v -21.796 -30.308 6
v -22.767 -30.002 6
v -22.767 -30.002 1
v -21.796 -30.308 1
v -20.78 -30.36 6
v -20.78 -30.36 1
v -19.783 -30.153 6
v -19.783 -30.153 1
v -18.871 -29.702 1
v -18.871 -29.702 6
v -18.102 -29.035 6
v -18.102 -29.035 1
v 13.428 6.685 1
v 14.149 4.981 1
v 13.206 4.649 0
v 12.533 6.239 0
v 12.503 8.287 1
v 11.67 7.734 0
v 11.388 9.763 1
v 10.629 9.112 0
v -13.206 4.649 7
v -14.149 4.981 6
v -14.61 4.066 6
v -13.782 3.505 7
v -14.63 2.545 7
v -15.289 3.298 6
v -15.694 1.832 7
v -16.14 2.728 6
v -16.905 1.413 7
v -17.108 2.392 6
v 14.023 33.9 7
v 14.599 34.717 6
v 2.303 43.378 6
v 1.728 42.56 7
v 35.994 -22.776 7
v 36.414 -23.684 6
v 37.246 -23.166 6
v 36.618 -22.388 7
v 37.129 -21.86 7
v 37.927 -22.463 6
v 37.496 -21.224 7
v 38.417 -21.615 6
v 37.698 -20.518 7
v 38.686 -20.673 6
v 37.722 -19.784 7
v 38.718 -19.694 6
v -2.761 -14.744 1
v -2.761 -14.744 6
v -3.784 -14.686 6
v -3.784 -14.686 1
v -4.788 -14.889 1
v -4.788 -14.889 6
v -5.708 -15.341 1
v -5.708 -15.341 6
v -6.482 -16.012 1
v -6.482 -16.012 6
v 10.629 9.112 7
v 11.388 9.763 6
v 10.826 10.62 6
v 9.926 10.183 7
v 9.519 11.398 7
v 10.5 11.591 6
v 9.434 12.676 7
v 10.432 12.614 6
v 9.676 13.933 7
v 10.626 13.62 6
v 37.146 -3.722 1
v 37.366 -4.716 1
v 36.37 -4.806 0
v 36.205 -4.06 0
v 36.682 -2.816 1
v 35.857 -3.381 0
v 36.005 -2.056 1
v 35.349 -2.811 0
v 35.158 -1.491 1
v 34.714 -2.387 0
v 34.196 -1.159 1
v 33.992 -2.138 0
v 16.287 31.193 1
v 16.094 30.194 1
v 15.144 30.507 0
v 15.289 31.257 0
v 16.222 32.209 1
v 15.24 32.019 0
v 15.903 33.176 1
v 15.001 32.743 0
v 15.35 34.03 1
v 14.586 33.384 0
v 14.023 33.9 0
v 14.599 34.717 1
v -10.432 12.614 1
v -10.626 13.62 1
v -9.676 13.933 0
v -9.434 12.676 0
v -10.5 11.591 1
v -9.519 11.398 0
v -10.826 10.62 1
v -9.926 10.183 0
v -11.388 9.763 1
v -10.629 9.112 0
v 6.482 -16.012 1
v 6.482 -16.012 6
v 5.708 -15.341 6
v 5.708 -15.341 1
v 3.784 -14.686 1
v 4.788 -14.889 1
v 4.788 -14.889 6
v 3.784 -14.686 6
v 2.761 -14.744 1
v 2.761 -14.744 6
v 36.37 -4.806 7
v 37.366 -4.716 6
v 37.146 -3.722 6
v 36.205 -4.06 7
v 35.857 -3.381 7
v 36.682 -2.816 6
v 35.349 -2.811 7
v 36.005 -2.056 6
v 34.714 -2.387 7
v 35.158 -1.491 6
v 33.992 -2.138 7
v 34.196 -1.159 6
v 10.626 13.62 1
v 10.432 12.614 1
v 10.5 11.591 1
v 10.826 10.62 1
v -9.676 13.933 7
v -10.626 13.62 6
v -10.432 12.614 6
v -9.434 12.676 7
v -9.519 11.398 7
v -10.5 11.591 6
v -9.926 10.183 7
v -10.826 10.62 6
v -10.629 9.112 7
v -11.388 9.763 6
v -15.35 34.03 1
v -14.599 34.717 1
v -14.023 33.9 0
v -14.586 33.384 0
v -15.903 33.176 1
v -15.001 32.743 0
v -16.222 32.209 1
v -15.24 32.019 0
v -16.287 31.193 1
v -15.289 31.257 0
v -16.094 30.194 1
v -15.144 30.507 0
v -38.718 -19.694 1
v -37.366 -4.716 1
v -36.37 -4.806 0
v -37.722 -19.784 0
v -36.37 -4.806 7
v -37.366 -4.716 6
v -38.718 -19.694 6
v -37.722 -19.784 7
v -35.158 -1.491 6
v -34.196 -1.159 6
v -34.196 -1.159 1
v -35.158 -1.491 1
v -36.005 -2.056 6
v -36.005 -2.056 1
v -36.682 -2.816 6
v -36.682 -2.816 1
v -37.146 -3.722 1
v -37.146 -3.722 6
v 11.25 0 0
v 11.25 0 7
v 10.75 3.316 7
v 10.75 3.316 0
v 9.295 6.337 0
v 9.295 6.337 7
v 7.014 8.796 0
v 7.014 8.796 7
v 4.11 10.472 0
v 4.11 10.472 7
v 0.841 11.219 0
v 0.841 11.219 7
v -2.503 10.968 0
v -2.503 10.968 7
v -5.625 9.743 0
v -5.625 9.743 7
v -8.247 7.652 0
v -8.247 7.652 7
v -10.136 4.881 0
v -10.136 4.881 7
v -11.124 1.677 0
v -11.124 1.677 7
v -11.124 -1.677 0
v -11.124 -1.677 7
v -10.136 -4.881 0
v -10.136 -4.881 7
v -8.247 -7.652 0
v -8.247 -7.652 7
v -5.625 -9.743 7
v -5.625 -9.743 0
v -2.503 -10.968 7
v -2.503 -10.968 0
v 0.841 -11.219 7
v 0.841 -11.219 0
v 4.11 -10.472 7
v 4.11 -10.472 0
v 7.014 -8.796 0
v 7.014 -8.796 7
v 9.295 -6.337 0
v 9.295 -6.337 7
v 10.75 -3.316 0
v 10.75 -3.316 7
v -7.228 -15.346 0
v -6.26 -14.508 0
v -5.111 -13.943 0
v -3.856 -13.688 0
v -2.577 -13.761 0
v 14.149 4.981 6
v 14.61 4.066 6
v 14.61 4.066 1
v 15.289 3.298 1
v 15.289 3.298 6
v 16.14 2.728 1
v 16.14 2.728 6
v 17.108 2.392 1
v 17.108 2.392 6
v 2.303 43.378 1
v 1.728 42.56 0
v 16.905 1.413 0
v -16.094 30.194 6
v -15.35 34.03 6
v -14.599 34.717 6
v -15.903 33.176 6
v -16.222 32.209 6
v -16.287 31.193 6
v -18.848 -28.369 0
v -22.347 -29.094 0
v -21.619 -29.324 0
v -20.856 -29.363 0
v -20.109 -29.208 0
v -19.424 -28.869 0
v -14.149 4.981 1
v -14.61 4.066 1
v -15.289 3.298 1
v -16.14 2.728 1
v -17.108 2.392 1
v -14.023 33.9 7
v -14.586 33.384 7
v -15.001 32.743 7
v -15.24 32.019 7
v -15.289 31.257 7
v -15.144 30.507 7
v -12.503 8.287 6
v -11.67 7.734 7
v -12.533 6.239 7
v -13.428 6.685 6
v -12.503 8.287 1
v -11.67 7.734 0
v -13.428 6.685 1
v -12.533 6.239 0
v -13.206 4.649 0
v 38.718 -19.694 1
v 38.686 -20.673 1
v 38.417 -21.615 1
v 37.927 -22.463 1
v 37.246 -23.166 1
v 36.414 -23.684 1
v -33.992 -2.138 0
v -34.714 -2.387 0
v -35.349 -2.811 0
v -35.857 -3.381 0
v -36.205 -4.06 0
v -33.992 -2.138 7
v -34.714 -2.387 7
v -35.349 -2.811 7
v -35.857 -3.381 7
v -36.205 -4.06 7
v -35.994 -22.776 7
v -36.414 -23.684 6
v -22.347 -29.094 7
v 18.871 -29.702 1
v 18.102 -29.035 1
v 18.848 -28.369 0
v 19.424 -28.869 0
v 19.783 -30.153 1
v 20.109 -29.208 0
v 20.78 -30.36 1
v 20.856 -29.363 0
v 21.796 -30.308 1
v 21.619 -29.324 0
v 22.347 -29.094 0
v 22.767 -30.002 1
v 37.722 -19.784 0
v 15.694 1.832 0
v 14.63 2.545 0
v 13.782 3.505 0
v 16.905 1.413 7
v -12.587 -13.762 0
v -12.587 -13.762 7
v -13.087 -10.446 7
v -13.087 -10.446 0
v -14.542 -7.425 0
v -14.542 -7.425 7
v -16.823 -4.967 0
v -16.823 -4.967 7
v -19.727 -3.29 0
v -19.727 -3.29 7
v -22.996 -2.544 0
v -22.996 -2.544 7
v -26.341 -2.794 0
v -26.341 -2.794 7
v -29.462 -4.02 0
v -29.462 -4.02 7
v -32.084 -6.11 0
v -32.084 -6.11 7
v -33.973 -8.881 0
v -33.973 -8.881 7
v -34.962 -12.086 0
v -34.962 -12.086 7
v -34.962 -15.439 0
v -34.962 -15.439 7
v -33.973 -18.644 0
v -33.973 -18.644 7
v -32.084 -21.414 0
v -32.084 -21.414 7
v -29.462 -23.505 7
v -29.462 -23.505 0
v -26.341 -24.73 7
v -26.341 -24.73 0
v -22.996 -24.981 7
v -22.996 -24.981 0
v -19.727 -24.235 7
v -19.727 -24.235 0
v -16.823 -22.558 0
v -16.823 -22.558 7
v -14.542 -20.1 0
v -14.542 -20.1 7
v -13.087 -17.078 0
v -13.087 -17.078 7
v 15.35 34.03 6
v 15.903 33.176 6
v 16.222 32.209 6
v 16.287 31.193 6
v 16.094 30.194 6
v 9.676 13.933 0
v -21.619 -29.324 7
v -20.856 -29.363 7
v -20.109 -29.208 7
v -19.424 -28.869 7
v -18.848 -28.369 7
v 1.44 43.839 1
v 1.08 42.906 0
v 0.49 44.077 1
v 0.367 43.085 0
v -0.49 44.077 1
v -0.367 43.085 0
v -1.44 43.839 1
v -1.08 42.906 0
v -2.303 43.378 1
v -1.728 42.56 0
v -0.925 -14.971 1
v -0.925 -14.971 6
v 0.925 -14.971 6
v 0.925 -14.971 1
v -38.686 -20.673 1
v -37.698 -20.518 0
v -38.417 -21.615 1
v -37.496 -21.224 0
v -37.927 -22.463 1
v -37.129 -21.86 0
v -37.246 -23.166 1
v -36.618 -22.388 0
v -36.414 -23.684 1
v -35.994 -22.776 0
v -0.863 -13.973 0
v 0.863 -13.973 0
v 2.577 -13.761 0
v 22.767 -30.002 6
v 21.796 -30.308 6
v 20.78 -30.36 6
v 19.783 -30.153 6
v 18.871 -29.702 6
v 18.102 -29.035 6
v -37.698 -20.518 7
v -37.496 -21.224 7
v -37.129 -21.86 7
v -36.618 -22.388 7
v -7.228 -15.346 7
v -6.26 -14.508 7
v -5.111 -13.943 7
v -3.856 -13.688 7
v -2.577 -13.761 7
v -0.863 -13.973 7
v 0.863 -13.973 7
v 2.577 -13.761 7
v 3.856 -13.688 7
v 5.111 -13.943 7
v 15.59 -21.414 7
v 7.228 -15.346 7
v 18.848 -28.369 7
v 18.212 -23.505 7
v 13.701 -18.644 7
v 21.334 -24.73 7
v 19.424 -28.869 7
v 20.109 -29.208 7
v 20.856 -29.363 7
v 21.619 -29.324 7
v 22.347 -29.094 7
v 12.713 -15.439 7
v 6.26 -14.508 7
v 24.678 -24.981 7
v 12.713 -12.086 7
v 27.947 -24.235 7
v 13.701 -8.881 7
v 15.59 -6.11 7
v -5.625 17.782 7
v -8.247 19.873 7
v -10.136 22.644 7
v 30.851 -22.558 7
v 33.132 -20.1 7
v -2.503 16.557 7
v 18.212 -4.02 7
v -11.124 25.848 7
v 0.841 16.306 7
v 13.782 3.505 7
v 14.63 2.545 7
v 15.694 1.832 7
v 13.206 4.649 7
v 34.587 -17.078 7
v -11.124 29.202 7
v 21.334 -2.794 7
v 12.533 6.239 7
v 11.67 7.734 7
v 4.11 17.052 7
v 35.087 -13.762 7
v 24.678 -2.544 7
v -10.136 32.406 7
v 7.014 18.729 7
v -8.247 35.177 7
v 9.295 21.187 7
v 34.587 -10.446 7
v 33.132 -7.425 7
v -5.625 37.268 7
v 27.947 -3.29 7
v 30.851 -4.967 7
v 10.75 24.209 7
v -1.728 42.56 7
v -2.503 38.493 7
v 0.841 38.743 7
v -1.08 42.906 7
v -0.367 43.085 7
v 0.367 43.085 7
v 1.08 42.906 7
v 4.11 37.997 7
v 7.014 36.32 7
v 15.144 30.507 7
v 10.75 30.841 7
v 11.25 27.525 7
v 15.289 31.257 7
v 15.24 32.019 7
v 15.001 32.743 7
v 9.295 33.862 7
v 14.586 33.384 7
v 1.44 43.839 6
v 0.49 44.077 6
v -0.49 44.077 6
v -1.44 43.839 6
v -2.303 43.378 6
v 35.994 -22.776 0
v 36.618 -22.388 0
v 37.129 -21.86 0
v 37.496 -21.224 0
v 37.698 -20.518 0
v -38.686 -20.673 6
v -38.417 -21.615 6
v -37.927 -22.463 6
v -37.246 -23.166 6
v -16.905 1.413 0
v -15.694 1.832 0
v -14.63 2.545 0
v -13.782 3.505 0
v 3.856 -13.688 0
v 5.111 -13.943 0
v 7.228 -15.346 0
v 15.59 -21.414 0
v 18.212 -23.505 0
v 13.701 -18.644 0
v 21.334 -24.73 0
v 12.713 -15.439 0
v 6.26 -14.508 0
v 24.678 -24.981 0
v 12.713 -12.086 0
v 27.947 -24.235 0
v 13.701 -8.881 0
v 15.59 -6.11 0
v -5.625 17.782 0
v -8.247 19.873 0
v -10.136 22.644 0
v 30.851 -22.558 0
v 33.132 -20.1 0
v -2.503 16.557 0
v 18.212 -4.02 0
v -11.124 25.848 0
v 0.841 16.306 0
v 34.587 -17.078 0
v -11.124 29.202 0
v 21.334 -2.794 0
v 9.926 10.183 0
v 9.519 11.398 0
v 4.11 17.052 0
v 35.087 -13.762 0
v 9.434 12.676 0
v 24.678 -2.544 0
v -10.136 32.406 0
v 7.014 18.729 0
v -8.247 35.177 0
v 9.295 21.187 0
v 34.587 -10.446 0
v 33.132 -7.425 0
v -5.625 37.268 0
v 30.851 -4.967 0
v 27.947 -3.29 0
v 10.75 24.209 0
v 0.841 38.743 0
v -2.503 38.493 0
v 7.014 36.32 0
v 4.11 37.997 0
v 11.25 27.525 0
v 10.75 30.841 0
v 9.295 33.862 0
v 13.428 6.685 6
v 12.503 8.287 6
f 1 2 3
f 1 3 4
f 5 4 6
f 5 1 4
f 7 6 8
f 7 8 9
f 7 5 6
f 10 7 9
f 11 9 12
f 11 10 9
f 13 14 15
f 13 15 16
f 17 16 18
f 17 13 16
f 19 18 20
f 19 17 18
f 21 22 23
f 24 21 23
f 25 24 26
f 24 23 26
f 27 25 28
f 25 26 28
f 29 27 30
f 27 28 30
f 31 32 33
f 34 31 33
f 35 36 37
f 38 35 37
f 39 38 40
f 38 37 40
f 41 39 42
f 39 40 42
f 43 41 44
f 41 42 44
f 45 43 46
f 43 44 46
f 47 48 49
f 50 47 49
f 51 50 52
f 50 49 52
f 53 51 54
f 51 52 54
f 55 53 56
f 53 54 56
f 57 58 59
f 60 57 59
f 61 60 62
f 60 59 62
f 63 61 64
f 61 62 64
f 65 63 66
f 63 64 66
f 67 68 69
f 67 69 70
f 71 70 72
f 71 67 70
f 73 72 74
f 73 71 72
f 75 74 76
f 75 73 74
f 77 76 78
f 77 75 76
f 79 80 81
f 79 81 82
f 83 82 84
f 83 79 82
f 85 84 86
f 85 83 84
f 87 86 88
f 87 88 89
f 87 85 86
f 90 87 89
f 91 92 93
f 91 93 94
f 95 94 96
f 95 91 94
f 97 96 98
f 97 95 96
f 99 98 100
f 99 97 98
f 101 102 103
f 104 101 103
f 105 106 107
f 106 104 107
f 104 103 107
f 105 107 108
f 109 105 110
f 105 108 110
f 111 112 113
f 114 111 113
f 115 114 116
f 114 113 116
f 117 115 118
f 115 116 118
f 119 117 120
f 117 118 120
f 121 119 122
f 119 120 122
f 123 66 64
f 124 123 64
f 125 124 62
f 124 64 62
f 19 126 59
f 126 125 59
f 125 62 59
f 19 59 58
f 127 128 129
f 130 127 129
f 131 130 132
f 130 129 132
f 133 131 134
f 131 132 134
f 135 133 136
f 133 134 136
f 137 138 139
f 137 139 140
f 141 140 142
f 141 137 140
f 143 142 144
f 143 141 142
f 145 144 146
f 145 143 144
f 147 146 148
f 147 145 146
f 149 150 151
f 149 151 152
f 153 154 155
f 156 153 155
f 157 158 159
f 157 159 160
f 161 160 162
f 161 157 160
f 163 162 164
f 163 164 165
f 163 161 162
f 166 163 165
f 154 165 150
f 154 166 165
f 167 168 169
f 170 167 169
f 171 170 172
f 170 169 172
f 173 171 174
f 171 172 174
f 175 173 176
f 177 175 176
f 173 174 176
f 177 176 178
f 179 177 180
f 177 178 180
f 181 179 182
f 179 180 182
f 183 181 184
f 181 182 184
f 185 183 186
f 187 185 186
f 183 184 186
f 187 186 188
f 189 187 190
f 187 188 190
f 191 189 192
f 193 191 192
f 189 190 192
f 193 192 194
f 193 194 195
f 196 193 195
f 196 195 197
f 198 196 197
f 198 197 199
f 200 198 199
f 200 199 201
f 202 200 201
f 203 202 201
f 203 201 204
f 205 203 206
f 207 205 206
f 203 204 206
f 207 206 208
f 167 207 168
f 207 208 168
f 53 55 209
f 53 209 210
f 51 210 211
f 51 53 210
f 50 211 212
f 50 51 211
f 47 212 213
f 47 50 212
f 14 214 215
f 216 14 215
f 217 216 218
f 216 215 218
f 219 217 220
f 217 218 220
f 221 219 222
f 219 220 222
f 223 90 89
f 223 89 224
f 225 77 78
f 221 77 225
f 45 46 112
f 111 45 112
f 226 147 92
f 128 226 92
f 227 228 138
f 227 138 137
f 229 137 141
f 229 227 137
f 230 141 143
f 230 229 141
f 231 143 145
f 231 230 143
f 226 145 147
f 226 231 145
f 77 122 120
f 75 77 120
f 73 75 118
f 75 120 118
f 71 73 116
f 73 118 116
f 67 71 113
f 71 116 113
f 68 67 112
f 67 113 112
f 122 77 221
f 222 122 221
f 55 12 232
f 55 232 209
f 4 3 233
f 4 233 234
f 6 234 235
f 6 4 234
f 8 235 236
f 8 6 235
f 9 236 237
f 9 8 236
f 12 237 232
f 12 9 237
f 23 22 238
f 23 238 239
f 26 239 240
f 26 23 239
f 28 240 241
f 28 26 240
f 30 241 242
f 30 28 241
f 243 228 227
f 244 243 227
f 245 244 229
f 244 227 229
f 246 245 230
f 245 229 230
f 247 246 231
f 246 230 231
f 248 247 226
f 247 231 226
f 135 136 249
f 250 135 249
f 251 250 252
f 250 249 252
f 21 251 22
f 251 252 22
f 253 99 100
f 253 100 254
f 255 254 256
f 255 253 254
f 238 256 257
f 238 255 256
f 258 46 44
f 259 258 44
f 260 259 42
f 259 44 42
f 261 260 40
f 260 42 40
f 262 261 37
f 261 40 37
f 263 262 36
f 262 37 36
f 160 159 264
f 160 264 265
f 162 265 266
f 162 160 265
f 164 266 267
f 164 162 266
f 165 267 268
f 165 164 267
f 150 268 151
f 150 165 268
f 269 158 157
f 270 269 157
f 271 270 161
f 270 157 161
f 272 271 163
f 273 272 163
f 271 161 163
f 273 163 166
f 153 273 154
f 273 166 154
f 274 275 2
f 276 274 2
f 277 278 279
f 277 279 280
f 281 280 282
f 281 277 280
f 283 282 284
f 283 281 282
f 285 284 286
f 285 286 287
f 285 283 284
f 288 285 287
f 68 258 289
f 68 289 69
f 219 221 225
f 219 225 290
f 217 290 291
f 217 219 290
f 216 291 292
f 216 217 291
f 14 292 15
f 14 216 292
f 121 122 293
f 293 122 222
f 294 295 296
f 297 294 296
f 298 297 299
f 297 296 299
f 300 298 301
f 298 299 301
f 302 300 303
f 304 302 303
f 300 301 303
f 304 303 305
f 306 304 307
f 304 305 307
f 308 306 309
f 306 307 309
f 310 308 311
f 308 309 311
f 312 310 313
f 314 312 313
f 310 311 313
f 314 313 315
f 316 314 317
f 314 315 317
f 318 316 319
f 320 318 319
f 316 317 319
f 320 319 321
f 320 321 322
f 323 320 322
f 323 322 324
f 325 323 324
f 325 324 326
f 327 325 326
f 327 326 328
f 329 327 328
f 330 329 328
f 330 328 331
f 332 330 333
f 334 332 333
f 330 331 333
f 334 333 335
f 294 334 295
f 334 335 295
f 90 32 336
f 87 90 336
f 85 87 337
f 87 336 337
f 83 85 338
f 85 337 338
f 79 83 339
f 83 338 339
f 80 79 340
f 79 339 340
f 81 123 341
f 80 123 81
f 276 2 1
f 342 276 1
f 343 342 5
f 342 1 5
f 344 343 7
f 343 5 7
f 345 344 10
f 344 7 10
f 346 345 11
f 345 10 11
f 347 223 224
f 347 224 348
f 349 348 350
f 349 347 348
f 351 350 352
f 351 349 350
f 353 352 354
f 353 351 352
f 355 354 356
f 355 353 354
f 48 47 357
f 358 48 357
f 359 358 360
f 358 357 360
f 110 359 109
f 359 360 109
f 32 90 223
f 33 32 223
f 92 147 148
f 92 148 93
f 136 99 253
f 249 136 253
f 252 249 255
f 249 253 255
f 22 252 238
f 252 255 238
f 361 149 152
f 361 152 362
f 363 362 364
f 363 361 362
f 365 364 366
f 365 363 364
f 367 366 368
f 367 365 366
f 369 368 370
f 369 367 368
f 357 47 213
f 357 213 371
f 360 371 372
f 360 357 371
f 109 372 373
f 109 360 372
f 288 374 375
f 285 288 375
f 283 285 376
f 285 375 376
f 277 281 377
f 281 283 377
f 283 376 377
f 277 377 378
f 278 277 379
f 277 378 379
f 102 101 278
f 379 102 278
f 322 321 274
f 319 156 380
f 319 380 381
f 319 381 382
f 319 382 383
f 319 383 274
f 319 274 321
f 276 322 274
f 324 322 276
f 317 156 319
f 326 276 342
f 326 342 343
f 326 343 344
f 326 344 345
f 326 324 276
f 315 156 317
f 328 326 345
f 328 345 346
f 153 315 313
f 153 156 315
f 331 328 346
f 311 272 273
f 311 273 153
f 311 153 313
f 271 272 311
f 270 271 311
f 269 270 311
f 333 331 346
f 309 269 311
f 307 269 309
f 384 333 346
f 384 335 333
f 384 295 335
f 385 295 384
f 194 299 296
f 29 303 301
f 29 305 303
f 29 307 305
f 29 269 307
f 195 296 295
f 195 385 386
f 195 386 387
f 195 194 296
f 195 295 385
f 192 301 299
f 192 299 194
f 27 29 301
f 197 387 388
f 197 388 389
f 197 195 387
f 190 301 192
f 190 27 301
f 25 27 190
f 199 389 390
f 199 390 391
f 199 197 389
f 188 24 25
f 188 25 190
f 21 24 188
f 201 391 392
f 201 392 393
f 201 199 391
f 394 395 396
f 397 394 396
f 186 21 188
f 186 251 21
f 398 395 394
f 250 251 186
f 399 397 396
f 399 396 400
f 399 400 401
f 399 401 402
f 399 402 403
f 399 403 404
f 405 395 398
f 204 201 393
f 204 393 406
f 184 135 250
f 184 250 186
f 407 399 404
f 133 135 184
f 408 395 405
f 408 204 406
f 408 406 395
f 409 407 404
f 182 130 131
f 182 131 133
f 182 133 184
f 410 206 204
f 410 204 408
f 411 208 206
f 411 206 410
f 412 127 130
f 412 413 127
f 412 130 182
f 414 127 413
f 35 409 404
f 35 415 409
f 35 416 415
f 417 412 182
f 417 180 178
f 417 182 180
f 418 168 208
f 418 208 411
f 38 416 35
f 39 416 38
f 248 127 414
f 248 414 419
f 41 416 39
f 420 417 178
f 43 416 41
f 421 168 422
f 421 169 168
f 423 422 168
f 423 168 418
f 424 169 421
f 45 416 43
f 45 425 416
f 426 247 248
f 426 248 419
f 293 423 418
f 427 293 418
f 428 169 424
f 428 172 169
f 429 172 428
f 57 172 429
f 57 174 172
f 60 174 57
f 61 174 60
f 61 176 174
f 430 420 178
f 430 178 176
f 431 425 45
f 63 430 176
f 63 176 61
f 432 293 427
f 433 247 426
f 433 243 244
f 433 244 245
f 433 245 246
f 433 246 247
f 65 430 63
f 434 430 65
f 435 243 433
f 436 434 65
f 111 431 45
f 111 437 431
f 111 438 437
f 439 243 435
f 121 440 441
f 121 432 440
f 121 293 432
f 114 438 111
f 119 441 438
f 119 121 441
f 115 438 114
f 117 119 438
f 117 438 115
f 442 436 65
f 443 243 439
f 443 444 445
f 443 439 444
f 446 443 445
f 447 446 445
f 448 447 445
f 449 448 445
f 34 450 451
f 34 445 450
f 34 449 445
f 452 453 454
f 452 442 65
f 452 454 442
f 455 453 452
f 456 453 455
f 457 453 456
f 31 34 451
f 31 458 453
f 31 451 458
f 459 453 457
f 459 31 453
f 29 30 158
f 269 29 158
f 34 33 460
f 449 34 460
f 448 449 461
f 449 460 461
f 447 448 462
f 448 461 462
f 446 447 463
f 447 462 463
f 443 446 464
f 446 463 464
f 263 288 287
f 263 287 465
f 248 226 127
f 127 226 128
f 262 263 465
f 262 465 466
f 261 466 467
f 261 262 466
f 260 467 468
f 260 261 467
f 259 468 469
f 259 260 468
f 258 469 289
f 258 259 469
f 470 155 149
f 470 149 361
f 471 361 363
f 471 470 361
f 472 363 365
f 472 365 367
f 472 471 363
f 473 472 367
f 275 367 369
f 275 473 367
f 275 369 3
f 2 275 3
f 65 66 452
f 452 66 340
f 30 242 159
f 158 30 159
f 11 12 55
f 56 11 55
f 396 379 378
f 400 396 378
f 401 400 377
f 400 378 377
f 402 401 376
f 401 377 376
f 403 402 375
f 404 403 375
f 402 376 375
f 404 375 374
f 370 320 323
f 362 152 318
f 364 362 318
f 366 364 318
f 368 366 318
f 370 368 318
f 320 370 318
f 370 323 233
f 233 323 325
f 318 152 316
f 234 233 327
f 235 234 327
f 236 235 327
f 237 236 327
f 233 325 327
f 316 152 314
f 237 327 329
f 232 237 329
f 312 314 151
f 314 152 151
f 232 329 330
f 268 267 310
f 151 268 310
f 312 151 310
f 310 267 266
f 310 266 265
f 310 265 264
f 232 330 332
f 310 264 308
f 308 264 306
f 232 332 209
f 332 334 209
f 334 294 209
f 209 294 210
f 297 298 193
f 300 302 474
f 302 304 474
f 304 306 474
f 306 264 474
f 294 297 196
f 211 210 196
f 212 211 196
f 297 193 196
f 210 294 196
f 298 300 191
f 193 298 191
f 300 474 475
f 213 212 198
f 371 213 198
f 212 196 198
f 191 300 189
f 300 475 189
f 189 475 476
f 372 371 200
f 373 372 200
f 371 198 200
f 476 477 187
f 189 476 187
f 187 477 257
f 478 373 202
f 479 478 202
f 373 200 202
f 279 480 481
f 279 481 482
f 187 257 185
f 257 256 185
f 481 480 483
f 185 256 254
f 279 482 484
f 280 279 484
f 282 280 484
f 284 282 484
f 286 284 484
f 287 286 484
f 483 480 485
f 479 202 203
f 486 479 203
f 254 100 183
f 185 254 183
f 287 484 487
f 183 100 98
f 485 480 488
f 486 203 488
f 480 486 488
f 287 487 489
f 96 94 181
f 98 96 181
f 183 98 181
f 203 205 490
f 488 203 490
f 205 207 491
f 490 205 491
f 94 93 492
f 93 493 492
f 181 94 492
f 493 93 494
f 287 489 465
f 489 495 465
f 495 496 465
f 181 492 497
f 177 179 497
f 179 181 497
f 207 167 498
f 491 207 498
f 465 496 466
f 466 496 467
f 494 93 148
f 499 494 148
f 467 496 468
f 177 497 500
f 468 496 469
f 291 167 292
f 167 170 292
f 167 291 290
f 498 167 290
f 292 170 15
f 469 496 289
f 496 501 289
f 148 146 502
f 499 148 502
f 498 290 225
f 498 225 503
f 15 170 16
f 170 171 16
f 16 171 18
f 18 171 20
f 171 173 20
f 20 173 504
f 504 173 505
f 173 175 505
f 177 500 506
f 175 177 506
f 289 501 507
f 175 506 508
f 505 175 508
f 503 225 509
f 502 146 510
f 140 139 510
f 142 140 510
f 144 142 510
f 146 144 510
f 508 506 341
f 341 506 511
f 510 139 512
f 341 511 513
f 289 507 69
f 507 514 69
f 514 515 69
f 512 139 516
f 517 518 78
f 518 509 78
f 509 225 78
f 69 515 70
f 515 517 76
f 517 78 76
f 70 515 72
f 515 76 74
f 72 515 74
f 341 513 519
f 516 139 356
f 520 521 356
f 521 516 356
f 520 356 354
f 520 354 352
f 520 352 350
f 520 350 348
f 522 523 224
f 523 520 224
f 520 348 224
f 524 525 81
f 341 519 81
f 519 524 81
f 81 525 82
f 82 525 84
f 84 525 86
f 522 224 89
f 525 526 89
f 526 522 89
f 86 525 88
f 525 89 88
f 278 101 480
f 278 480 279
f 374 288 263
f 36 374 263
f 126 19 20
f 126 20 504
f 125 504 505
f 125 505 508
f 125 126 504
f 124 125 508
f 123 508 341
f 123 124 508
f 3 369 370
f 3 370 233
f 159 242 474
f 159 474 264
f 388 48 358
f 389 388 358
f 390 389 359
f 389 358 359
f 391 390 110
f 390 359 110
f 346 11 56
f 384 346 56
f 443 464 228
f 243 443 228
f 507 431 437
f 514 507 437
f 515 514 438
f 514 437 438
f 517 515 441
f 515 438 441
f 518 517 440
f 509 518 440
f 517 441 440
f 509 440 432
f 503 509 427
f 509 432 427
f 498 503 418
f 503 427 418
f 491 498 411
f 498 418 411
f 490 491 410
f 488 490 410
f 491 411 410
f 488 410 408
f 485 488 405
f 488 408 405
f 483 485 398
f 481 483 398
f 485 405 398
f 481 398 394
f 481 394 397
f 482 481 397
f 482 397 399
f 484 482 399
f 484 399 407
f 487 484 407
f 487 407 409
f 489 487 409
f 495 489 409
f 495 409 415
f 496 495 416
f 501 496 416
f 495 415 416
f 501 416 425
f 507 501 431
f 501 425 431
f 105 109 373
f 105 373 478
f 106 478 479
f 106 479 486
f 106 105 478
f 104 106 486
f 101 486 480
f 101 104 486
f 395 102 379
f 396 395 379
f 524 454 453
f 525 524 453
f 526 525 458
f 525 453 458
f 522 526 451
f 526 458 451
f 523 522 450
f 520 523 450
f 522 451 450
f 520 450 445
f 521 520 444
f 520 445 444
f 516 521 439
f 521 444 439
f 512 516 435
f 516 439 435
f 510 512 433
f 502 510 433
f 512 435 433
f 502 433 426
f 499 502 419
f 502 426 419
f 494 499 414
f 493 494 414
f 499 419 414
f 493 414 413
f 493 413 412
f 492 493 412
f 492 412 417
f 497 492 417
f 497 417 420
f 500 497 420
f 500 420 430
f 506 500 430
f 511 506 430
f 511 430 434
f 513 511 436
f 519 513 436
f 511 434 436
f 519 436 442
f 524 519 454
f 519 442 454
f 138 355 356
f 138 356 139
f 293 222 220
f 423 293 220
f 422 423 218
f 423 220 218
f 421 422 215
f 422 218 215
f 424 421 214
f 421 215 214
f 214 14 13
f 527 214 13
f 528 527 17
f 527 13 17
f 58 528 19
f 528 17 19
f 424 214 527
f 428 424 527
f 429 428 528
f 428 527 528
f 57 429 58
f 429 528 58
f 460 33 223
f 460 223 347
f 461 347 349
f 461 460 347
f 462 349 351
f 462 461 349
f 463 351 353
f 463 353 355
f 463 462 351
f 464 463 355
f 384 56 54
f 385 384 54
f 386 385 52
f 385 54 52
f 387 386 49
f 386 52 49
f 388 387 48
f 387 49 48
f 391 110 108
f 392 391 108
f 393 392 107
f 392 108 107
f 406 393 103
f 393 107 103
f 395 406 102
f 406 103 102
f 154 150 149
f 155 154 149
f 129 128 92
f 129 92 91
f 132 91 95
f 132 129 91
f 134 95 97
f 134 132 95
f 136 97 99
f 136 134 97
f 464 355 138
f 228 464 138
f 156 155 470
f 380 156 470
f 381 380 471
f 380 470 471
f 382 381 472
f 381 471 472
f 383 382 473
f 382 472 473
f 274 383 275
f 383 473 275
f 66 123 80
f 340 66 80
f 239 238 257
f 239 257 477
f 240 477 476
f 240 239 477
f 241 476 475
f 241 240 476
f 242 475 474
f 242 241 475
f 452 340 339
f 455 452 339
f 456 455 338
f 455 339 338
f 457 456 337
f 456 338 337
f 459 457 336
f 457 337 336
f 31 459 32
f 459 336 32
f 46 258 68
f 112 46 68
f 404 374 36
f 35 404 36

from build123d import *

# Parameters (mm, degrees)
F0_R     = 11.635
F0_R_2   = 11.3175
F1_DEPTH = 7
F2_R     = 4
F3_SIZE  = 1
F4_R     = 11.3175
F4_R_2   = 11.25
F4_R_3   = 11.635
F5_DEPTH = 7


with BuildPart() as f1:
    # F0 (on Top) → F1 (new body)
    with BuildSketch(Plane.XY):
        with BuildLine():
            Line((17.023025, 33.009872), (0, 45))
            Line((0, 45), (-17.023025, 33.009872))
            Line((-17.023025, 33.009872), (-9.861474, 11.302714))
            ThreePointArc((-9.861474, 11.302714), (0, 15), (9.861474, 11.302714))
            Line((9.861474, 11.302714), (17.023025, 33.009872))
        make_face()
        with Locations((0, 27.524821)):
            Circle(F0_R, mode=Mode.SUBTRACT)
        with BuildLine():
            ThreePointArc((9.861474, 11.302714), (0, 15), (-9.861474, 11.302714))
            ThreePointArc((-9.861474, 11.302714), (-12.990381, 7.5), (-14.719174, 2.88893))
            ThreePointArc((-14.719174, 2.88893), (-12.990381, -7.5), (-4.8577, -14.191644))
            ThreePointArc((-4.8577, -14.191644), (0, -15), (4.8577, -14.191644))
            ThreePointArc((4.8577, -14.191644), (12.203801, -8.721654), (15, 0))
            ThreePointArc((15, 0), (14.929628, 1.451273), (14.719174, 2.88893))
            ThreePointArc((14.719174, 2.88893), (12.990381, 7.5), (9.861474, 11.302714))
        make_face()
        Circle(F0_R_2, mode=Mode.SUBTRACT)
        with BuildLine():
            ThreePointArc((-4.8577, -14.191644), (-12.990381, -7.5), (-14.719174, 2.88893))
            Line((-14.719174, 2.88893), (-37.0989, -1.762564))
            Line((-37.0989, -1.762564), (-38.971143, -22.5))
            Line((-38.971143, -22.5), (-20.075875, -31.247308))
            Line((-20.075875, -31.247308), (-4.8577, -14.191644))
        make_face()
        with Locations((-23.837195, -13.762411)):
            Circle(F0_R, mode=Mode.SUBTRACT)
        with BuildLine():
            Line((37.0989, -1.762564), (14.719174, 2.88893))
            ThreePointArc((14.719174, 2.88893), (14.929628, 1.451273), (15, 0))
            ThreePointArc((15, 0), (12.203801, -8.721654), (4.8577, -14.191644))
            Line((4.8577, -14.191644), (20.075875, -31.247308))
            Line((20.075875, -31.247308), (38.971143, -22.5))
            Line((38.971143, -22.5), (37.0989, -1.762564))
        make_face()
        with Locations((23.837195, -13.762411)):
            Circle(F0_R, mode=Mode.SUBTRACT)
    extrude(amount=F1_DEPTH)

    # F2
    f2_edges = [f1.edges().sort_by_distance(p)[0] for p in [
        (-20.075875, -31.247308, 3.5),
        (20.075875, -31.247308, 3.5),
        (38.971143, -22.5, 3.5),
        (37.0989, -1.762564, 3.5),
        (14.719174, 2.88893, 3.5),
        (9.861474, 11.302714, 3.5),
        (17.023025, 33.009872, 3.5),
        (0, 45, 3.5),
        (-17.023025, 33.009872, 3.5),
        (-9.861474, 11.302714, 3.5),
        (-14.719174, 2.88893, 3.5),
        (-37.0989, -1.762564, 3.5),
        (-38.971143, -22.5, 3.5),
        (-4.8577, -14.191644, 3.5),
        (4.8577, -14.191644, 3.5),
    ]]
    fillet(f2_edges, radius=F2_R)

    # F3
    f3_edges = [f1.edges().sort_by_distance(p)[0] for p in [
        (-13.359963, 21.906877, 7),
        (-13.359963, 21.906877, 0),
    ]]
    chamfer(f3_edges, length=F3_SIZE)

    # F4 (on face) → F5 (join)
    with BuildSketch(Plane.XY.offset(7)):
        Circle(F4_R)
        Circle(F4_R_2, mode=Mode.SUBTRACT)
        with Locations((0, 27.524821)):
            Circle(F4_R_3)
        with Locations((0, 27.524821)):
            Circle(F4_R_2, mode=Mode.SUBTRACT)
        with Locations((-23.837195, -13.762411)):
            Circle(F4_R_3)
        with Locations((-23.837195, -13.762411)):
            Circle(F4_R_2, mode=Mode.SUBTRACT)
        with Locations((23.837195, -13.762411)):
            Circle(F4_R_3)
        with Locations((23.837195, -13.762411)):
            Circle(F4_R_2, mode=Mode.SUBTRACT)
    extrude(amount=-F5_DEPTH)


solid = f1.part
